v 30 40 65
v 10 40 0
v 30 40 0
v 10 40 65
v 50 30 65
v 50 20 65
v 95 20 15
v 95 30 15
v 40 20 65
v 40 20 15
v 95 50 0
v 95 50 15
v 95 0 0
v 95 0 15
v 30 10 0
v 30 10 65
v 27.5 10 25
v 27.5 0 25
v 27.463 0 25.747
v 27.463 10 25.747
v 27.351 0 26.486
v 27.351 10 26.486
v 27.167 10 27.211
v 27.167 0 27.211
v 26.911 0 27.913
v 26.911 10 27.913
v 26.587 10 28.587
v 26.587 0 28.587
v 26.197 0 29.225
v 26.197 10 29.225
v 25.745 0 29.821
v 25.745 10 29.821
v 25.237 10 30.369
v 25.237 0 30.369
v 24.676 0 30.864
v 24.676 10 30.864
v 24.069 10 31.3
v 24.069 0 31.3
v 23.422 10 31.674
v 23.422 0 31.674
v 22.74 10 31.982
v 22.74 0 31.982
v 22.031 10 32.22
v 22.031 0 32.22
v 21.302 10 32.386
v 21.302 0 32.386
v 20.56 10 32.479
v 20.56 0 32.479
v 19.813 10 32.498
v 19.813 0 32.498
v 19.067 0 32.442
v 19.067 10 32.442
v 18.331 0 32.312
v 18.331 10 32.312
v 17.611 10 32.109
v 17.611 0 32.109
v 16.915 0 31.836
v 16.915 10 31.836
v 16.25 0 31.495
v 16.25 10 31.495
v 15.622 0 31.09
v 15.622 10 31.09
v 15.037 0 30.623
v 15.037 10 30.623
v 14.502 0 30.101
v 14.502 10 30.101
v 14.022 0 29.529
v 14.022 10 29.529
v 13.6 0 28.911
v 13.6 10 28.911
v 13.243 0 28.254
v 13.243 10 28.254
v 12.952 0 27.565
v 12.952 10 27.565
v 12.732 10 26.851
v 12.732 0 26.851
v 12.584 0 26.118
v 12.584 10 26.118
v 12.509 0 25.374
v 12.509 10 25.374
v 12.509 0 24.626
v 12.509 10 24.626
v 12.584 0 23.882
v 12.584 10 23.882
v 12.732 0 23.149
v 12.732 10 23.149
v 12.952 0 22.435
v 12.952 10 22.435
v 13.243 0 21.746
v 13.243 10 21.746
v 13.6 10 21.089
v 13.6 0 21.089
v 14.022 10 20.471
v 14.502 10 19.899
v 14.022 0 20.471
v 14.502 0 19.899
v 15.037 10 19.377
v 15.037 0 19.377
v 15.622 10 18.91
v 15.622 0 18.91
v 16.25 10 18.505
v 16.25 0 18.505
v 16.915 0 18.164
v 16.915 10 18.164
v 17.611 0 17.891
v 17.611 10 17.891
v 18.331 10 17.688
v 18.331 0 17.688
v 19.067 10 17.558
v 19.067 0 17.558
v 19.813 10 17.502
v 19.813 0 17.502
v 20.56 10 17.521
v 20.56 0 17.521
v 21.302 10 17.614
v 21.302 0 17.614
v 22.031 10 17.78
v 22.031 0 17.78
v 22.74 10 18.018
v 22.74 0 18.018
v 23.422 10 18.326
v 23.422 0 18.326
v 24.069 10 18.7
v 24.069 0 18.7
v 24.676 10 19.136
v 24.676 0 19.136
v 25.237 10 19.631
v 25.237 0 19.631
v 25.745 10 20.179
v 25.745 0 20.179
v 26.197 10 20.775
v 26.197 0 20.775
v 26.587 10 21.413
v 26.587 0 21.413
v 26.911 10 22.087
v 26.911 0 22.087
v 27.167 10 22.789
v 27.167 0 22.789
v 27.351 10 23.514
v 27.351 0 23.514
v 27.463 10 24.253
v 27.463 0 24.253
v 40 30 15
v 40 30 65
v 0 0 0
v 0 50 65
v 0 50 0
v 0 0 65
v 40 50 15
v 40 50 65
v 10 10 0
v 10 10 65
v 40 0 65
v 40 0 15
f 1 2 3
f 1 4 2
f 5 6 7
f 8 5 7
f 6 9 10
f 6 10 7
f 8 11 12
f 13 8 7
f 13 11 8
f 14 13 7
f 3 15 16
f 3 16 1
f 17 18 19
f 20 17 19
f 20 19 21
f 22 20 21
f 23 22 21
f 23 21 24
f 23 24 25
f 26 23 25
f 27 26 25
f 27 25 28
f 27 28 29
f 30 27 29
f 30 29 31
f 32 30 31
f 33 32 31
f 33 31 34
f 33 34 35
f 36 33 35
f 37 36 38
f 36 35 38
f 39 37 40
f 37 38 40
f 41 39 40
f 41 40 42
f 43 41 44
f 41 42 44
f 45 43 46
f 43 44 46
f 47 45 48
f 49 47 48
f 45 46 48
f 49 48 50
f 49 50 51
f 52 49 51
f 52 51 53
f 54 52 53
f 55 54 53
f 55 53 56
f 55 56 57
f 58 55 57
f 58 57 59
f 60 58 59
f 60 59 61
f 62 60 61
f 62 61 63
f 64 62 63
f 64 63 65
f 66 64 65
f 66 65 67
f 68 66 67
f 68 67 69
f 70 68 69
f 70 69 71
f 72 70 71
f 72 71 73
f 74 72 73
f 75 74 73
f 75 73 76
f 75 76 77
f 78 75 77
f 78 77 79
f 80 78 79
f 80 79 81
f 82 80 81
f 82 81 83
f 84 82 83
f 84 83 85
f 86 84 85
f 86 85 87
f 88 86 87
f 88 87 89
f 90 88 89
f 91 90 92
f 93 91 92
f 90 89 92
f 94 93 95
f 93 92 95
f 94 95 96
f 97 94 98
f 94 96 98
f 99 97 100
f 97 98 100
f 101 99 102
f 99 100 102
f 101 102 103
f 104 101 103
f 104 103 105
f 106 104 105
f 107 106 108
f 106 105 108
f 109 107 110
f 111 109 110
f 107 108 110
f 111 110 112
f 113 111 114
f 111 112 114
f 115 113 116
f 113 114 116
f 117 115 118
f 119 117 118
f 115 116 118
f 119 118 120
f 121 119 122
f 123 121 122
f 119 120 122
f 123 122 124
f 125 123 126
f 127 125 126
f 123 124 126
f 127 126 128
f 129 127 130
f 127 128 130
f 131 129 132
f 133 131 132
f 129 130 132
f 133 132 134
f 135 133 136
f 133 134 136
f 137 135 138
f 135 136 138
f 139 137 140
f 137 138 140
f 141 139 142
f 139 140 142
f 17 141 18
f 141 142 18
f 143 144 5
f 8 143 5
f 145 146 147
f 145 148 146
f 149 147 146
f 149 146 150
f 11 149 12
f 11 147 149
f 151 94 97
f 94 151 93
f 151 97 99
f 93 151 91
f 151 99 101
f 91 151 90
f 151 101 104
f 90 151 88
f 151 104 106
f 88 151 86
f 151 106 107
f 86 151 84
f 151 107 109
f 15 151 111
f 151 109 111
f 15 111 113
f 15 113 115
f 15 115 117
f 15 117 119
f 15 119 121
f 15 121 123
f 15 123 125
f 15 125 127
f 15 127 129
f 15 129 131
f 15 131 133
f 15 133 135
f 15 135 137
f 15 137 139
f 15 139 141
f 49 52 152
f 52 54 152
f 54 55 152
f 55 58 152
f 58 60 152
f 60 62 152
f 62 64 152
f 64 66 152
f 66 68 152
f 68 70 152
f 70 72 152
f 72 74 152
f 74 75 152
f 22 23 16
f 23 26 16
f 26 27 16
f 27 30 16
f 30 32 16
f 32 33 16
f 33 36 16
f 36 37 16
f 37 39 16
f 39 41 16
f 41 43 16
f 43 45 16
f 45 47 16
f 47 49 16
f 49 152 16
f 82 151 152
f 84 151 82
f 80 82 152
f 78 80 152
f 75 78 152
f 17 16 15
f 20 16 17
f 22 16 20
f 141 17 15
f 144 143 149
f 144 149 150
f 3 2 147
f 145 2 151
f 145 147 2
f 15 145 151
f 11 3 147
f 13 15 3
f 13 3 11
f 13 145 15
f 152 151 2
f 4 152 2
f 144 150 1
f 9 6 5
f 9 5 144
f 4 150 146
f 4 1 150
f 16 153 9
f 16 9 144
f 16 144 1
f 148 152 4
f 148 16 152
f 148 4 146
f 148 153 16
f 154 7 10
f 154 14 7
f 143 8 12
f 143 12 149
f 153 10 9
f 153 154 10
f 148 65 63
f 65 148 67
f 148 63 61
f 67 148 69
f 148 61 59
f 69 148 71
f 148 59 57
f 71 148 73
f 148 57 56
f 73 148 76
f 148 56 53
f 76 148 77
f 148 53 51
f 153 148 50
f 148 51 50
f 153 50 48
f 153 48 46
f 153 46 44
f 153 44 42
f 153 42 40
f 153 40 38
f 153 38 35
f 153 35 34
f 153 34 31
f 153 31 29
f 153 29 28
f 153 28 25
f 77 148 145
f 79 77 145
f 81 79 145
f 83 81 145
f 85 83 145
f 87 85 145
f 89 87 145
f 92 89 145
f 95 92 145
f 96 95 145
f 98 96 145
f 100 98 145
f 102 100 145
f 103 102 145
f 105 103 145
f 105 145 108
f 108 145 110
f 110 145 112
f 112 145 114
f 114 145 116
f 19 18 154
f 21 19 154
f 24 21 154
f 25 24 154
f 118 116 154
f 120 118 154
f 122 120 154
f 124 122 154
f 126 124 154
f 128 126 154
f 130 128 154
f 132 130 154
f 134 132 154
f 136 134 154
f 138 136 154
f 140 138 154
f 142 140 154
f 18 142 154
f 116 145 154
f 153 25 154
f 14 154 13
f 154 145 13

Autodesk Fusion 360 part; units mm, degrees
sketch "Sketch1" plane through (0, 0, 0) normal (0, 1, 0) x (1, 0, 0)
  line L0 (0, 0) -> (95, 0)
  line L1 (95, 0) -> (95, -15)
  line L2 (95, -15) -> (40, -15)
  line L3 (40, -15) -> (40, -65)
  line L4 (40, -65) -> (0, -65)
  line L5 (0, -65) -> (0, 0)
  dimension "d1" = 95
extrude "Extrude1" add sketch "Sketch1" along normal blind 50
sketch "Sketch2" plane through (0, 0, 65) normal (0, 0, 1) x (-1, 0, 0)
  line L0 (0, 0) -> (-40, 0)
  line L1 (-40, 0) -> (-40, -50)
  line L2 (-40, -50) -> (0, -50)
  line L3 (0, -50) -> (0, 0)
  line L4 (7.2091, -40) -> (5, -40)
  line L5 (-10, -10) -> (-30, -10)
  line L6 (-10, -40) -> (-30, -40)
  line L7 (-30, -10) -> (-30, -40)
  line L8 (-10, -10) -> (-10, -40)
extrude "Extrude2" cut sketch "Sketch2" against normal blind 90 contours L5 L6 L7 L8
sketch "Sketch3" plane through (0, 0, 0) normal (0, -1, 0) x (1, 0, 0)
  line L0 (40, 65) -> (0, 65)
  line L1 (0, 65) -> (0, 0)
  line L2 (0, 0) -> (95, 0)
  line L3 (95, 0) -> (95, 15)
  line L4 (95, 15) -> (40, 15)
  line L5 (40, 15) -> (40, 65)
  line L6 (-20, 25) -> (0, 25)
  circle A0 centre (20, 25) radius 7.5
  line L7 (20, 0) -> (20, -6.3794)
  dimension "d15" = 25
  dimension "d16" = 15
extrude "Extrude3" cut sketch "Sketch3" against normal blind 20 contours A0
sketch "Sketch4" plane through (0, 0, 15) normal (0, 0, 1) x (-1, 0, 0)
  line L0 (-40, 0) -> (-95, 0)
  line L1 (-95, 0) -> (-95, -50)
  line L2 (-95, -50) -> (-40, -50)
  line L3 (-40, -50) -> (-40, 0)
  line L4 (-40, -20) -> (-95, -20)
  line L5 (-40, -30) -> (-95, -30)
extrude "Extrude4" add sketch "Sketch4" along normal blind 50 contours L1 L3 L4 L5
sketch "Sketch5" plane through (0, 0, 65) normal (0, 0, 1) x (-1, 0, 0)
  line L0 (-10, -40) -> (-30, -40)
  line L1 (-30, -40) -> (-30, -10)
  line L2 (-30, -10) -> (-10, -10)
  line L3 (-10, -10) -> (-10, -40)
  line L4 (0, 0) -> (-40, 0)
  line L5 (-40, 0) -> (-40, -20)
  line L6 (-40, -30) -> (-40, -50)
  line L7 (-40, -50) -> (0, -50)
  line L8 (0, -50) -> (0, 0)
sketch "Sketch6" plane through (0, 20, 0) normal (0, -1, 0) x (1, 0, 0)
  line L0 (40, 15) -> (95, 15)
  line L1 (95, 15) -> (95, 65)
  line L2 (95, 65) -> (40, 65)
  line L3 (40, 65) -> (40, 15)
  line L4 (50, 65) -> (95, 15)
  point P0 (50, 65)
extrude "Extrude5" cut sketch "Sketch6" against normal blind 65 contours L1 L2 L4
sketch "Sketch7" plane through (0, 0, 0) normal (0, 1, 0) x (1, 0, 0)
